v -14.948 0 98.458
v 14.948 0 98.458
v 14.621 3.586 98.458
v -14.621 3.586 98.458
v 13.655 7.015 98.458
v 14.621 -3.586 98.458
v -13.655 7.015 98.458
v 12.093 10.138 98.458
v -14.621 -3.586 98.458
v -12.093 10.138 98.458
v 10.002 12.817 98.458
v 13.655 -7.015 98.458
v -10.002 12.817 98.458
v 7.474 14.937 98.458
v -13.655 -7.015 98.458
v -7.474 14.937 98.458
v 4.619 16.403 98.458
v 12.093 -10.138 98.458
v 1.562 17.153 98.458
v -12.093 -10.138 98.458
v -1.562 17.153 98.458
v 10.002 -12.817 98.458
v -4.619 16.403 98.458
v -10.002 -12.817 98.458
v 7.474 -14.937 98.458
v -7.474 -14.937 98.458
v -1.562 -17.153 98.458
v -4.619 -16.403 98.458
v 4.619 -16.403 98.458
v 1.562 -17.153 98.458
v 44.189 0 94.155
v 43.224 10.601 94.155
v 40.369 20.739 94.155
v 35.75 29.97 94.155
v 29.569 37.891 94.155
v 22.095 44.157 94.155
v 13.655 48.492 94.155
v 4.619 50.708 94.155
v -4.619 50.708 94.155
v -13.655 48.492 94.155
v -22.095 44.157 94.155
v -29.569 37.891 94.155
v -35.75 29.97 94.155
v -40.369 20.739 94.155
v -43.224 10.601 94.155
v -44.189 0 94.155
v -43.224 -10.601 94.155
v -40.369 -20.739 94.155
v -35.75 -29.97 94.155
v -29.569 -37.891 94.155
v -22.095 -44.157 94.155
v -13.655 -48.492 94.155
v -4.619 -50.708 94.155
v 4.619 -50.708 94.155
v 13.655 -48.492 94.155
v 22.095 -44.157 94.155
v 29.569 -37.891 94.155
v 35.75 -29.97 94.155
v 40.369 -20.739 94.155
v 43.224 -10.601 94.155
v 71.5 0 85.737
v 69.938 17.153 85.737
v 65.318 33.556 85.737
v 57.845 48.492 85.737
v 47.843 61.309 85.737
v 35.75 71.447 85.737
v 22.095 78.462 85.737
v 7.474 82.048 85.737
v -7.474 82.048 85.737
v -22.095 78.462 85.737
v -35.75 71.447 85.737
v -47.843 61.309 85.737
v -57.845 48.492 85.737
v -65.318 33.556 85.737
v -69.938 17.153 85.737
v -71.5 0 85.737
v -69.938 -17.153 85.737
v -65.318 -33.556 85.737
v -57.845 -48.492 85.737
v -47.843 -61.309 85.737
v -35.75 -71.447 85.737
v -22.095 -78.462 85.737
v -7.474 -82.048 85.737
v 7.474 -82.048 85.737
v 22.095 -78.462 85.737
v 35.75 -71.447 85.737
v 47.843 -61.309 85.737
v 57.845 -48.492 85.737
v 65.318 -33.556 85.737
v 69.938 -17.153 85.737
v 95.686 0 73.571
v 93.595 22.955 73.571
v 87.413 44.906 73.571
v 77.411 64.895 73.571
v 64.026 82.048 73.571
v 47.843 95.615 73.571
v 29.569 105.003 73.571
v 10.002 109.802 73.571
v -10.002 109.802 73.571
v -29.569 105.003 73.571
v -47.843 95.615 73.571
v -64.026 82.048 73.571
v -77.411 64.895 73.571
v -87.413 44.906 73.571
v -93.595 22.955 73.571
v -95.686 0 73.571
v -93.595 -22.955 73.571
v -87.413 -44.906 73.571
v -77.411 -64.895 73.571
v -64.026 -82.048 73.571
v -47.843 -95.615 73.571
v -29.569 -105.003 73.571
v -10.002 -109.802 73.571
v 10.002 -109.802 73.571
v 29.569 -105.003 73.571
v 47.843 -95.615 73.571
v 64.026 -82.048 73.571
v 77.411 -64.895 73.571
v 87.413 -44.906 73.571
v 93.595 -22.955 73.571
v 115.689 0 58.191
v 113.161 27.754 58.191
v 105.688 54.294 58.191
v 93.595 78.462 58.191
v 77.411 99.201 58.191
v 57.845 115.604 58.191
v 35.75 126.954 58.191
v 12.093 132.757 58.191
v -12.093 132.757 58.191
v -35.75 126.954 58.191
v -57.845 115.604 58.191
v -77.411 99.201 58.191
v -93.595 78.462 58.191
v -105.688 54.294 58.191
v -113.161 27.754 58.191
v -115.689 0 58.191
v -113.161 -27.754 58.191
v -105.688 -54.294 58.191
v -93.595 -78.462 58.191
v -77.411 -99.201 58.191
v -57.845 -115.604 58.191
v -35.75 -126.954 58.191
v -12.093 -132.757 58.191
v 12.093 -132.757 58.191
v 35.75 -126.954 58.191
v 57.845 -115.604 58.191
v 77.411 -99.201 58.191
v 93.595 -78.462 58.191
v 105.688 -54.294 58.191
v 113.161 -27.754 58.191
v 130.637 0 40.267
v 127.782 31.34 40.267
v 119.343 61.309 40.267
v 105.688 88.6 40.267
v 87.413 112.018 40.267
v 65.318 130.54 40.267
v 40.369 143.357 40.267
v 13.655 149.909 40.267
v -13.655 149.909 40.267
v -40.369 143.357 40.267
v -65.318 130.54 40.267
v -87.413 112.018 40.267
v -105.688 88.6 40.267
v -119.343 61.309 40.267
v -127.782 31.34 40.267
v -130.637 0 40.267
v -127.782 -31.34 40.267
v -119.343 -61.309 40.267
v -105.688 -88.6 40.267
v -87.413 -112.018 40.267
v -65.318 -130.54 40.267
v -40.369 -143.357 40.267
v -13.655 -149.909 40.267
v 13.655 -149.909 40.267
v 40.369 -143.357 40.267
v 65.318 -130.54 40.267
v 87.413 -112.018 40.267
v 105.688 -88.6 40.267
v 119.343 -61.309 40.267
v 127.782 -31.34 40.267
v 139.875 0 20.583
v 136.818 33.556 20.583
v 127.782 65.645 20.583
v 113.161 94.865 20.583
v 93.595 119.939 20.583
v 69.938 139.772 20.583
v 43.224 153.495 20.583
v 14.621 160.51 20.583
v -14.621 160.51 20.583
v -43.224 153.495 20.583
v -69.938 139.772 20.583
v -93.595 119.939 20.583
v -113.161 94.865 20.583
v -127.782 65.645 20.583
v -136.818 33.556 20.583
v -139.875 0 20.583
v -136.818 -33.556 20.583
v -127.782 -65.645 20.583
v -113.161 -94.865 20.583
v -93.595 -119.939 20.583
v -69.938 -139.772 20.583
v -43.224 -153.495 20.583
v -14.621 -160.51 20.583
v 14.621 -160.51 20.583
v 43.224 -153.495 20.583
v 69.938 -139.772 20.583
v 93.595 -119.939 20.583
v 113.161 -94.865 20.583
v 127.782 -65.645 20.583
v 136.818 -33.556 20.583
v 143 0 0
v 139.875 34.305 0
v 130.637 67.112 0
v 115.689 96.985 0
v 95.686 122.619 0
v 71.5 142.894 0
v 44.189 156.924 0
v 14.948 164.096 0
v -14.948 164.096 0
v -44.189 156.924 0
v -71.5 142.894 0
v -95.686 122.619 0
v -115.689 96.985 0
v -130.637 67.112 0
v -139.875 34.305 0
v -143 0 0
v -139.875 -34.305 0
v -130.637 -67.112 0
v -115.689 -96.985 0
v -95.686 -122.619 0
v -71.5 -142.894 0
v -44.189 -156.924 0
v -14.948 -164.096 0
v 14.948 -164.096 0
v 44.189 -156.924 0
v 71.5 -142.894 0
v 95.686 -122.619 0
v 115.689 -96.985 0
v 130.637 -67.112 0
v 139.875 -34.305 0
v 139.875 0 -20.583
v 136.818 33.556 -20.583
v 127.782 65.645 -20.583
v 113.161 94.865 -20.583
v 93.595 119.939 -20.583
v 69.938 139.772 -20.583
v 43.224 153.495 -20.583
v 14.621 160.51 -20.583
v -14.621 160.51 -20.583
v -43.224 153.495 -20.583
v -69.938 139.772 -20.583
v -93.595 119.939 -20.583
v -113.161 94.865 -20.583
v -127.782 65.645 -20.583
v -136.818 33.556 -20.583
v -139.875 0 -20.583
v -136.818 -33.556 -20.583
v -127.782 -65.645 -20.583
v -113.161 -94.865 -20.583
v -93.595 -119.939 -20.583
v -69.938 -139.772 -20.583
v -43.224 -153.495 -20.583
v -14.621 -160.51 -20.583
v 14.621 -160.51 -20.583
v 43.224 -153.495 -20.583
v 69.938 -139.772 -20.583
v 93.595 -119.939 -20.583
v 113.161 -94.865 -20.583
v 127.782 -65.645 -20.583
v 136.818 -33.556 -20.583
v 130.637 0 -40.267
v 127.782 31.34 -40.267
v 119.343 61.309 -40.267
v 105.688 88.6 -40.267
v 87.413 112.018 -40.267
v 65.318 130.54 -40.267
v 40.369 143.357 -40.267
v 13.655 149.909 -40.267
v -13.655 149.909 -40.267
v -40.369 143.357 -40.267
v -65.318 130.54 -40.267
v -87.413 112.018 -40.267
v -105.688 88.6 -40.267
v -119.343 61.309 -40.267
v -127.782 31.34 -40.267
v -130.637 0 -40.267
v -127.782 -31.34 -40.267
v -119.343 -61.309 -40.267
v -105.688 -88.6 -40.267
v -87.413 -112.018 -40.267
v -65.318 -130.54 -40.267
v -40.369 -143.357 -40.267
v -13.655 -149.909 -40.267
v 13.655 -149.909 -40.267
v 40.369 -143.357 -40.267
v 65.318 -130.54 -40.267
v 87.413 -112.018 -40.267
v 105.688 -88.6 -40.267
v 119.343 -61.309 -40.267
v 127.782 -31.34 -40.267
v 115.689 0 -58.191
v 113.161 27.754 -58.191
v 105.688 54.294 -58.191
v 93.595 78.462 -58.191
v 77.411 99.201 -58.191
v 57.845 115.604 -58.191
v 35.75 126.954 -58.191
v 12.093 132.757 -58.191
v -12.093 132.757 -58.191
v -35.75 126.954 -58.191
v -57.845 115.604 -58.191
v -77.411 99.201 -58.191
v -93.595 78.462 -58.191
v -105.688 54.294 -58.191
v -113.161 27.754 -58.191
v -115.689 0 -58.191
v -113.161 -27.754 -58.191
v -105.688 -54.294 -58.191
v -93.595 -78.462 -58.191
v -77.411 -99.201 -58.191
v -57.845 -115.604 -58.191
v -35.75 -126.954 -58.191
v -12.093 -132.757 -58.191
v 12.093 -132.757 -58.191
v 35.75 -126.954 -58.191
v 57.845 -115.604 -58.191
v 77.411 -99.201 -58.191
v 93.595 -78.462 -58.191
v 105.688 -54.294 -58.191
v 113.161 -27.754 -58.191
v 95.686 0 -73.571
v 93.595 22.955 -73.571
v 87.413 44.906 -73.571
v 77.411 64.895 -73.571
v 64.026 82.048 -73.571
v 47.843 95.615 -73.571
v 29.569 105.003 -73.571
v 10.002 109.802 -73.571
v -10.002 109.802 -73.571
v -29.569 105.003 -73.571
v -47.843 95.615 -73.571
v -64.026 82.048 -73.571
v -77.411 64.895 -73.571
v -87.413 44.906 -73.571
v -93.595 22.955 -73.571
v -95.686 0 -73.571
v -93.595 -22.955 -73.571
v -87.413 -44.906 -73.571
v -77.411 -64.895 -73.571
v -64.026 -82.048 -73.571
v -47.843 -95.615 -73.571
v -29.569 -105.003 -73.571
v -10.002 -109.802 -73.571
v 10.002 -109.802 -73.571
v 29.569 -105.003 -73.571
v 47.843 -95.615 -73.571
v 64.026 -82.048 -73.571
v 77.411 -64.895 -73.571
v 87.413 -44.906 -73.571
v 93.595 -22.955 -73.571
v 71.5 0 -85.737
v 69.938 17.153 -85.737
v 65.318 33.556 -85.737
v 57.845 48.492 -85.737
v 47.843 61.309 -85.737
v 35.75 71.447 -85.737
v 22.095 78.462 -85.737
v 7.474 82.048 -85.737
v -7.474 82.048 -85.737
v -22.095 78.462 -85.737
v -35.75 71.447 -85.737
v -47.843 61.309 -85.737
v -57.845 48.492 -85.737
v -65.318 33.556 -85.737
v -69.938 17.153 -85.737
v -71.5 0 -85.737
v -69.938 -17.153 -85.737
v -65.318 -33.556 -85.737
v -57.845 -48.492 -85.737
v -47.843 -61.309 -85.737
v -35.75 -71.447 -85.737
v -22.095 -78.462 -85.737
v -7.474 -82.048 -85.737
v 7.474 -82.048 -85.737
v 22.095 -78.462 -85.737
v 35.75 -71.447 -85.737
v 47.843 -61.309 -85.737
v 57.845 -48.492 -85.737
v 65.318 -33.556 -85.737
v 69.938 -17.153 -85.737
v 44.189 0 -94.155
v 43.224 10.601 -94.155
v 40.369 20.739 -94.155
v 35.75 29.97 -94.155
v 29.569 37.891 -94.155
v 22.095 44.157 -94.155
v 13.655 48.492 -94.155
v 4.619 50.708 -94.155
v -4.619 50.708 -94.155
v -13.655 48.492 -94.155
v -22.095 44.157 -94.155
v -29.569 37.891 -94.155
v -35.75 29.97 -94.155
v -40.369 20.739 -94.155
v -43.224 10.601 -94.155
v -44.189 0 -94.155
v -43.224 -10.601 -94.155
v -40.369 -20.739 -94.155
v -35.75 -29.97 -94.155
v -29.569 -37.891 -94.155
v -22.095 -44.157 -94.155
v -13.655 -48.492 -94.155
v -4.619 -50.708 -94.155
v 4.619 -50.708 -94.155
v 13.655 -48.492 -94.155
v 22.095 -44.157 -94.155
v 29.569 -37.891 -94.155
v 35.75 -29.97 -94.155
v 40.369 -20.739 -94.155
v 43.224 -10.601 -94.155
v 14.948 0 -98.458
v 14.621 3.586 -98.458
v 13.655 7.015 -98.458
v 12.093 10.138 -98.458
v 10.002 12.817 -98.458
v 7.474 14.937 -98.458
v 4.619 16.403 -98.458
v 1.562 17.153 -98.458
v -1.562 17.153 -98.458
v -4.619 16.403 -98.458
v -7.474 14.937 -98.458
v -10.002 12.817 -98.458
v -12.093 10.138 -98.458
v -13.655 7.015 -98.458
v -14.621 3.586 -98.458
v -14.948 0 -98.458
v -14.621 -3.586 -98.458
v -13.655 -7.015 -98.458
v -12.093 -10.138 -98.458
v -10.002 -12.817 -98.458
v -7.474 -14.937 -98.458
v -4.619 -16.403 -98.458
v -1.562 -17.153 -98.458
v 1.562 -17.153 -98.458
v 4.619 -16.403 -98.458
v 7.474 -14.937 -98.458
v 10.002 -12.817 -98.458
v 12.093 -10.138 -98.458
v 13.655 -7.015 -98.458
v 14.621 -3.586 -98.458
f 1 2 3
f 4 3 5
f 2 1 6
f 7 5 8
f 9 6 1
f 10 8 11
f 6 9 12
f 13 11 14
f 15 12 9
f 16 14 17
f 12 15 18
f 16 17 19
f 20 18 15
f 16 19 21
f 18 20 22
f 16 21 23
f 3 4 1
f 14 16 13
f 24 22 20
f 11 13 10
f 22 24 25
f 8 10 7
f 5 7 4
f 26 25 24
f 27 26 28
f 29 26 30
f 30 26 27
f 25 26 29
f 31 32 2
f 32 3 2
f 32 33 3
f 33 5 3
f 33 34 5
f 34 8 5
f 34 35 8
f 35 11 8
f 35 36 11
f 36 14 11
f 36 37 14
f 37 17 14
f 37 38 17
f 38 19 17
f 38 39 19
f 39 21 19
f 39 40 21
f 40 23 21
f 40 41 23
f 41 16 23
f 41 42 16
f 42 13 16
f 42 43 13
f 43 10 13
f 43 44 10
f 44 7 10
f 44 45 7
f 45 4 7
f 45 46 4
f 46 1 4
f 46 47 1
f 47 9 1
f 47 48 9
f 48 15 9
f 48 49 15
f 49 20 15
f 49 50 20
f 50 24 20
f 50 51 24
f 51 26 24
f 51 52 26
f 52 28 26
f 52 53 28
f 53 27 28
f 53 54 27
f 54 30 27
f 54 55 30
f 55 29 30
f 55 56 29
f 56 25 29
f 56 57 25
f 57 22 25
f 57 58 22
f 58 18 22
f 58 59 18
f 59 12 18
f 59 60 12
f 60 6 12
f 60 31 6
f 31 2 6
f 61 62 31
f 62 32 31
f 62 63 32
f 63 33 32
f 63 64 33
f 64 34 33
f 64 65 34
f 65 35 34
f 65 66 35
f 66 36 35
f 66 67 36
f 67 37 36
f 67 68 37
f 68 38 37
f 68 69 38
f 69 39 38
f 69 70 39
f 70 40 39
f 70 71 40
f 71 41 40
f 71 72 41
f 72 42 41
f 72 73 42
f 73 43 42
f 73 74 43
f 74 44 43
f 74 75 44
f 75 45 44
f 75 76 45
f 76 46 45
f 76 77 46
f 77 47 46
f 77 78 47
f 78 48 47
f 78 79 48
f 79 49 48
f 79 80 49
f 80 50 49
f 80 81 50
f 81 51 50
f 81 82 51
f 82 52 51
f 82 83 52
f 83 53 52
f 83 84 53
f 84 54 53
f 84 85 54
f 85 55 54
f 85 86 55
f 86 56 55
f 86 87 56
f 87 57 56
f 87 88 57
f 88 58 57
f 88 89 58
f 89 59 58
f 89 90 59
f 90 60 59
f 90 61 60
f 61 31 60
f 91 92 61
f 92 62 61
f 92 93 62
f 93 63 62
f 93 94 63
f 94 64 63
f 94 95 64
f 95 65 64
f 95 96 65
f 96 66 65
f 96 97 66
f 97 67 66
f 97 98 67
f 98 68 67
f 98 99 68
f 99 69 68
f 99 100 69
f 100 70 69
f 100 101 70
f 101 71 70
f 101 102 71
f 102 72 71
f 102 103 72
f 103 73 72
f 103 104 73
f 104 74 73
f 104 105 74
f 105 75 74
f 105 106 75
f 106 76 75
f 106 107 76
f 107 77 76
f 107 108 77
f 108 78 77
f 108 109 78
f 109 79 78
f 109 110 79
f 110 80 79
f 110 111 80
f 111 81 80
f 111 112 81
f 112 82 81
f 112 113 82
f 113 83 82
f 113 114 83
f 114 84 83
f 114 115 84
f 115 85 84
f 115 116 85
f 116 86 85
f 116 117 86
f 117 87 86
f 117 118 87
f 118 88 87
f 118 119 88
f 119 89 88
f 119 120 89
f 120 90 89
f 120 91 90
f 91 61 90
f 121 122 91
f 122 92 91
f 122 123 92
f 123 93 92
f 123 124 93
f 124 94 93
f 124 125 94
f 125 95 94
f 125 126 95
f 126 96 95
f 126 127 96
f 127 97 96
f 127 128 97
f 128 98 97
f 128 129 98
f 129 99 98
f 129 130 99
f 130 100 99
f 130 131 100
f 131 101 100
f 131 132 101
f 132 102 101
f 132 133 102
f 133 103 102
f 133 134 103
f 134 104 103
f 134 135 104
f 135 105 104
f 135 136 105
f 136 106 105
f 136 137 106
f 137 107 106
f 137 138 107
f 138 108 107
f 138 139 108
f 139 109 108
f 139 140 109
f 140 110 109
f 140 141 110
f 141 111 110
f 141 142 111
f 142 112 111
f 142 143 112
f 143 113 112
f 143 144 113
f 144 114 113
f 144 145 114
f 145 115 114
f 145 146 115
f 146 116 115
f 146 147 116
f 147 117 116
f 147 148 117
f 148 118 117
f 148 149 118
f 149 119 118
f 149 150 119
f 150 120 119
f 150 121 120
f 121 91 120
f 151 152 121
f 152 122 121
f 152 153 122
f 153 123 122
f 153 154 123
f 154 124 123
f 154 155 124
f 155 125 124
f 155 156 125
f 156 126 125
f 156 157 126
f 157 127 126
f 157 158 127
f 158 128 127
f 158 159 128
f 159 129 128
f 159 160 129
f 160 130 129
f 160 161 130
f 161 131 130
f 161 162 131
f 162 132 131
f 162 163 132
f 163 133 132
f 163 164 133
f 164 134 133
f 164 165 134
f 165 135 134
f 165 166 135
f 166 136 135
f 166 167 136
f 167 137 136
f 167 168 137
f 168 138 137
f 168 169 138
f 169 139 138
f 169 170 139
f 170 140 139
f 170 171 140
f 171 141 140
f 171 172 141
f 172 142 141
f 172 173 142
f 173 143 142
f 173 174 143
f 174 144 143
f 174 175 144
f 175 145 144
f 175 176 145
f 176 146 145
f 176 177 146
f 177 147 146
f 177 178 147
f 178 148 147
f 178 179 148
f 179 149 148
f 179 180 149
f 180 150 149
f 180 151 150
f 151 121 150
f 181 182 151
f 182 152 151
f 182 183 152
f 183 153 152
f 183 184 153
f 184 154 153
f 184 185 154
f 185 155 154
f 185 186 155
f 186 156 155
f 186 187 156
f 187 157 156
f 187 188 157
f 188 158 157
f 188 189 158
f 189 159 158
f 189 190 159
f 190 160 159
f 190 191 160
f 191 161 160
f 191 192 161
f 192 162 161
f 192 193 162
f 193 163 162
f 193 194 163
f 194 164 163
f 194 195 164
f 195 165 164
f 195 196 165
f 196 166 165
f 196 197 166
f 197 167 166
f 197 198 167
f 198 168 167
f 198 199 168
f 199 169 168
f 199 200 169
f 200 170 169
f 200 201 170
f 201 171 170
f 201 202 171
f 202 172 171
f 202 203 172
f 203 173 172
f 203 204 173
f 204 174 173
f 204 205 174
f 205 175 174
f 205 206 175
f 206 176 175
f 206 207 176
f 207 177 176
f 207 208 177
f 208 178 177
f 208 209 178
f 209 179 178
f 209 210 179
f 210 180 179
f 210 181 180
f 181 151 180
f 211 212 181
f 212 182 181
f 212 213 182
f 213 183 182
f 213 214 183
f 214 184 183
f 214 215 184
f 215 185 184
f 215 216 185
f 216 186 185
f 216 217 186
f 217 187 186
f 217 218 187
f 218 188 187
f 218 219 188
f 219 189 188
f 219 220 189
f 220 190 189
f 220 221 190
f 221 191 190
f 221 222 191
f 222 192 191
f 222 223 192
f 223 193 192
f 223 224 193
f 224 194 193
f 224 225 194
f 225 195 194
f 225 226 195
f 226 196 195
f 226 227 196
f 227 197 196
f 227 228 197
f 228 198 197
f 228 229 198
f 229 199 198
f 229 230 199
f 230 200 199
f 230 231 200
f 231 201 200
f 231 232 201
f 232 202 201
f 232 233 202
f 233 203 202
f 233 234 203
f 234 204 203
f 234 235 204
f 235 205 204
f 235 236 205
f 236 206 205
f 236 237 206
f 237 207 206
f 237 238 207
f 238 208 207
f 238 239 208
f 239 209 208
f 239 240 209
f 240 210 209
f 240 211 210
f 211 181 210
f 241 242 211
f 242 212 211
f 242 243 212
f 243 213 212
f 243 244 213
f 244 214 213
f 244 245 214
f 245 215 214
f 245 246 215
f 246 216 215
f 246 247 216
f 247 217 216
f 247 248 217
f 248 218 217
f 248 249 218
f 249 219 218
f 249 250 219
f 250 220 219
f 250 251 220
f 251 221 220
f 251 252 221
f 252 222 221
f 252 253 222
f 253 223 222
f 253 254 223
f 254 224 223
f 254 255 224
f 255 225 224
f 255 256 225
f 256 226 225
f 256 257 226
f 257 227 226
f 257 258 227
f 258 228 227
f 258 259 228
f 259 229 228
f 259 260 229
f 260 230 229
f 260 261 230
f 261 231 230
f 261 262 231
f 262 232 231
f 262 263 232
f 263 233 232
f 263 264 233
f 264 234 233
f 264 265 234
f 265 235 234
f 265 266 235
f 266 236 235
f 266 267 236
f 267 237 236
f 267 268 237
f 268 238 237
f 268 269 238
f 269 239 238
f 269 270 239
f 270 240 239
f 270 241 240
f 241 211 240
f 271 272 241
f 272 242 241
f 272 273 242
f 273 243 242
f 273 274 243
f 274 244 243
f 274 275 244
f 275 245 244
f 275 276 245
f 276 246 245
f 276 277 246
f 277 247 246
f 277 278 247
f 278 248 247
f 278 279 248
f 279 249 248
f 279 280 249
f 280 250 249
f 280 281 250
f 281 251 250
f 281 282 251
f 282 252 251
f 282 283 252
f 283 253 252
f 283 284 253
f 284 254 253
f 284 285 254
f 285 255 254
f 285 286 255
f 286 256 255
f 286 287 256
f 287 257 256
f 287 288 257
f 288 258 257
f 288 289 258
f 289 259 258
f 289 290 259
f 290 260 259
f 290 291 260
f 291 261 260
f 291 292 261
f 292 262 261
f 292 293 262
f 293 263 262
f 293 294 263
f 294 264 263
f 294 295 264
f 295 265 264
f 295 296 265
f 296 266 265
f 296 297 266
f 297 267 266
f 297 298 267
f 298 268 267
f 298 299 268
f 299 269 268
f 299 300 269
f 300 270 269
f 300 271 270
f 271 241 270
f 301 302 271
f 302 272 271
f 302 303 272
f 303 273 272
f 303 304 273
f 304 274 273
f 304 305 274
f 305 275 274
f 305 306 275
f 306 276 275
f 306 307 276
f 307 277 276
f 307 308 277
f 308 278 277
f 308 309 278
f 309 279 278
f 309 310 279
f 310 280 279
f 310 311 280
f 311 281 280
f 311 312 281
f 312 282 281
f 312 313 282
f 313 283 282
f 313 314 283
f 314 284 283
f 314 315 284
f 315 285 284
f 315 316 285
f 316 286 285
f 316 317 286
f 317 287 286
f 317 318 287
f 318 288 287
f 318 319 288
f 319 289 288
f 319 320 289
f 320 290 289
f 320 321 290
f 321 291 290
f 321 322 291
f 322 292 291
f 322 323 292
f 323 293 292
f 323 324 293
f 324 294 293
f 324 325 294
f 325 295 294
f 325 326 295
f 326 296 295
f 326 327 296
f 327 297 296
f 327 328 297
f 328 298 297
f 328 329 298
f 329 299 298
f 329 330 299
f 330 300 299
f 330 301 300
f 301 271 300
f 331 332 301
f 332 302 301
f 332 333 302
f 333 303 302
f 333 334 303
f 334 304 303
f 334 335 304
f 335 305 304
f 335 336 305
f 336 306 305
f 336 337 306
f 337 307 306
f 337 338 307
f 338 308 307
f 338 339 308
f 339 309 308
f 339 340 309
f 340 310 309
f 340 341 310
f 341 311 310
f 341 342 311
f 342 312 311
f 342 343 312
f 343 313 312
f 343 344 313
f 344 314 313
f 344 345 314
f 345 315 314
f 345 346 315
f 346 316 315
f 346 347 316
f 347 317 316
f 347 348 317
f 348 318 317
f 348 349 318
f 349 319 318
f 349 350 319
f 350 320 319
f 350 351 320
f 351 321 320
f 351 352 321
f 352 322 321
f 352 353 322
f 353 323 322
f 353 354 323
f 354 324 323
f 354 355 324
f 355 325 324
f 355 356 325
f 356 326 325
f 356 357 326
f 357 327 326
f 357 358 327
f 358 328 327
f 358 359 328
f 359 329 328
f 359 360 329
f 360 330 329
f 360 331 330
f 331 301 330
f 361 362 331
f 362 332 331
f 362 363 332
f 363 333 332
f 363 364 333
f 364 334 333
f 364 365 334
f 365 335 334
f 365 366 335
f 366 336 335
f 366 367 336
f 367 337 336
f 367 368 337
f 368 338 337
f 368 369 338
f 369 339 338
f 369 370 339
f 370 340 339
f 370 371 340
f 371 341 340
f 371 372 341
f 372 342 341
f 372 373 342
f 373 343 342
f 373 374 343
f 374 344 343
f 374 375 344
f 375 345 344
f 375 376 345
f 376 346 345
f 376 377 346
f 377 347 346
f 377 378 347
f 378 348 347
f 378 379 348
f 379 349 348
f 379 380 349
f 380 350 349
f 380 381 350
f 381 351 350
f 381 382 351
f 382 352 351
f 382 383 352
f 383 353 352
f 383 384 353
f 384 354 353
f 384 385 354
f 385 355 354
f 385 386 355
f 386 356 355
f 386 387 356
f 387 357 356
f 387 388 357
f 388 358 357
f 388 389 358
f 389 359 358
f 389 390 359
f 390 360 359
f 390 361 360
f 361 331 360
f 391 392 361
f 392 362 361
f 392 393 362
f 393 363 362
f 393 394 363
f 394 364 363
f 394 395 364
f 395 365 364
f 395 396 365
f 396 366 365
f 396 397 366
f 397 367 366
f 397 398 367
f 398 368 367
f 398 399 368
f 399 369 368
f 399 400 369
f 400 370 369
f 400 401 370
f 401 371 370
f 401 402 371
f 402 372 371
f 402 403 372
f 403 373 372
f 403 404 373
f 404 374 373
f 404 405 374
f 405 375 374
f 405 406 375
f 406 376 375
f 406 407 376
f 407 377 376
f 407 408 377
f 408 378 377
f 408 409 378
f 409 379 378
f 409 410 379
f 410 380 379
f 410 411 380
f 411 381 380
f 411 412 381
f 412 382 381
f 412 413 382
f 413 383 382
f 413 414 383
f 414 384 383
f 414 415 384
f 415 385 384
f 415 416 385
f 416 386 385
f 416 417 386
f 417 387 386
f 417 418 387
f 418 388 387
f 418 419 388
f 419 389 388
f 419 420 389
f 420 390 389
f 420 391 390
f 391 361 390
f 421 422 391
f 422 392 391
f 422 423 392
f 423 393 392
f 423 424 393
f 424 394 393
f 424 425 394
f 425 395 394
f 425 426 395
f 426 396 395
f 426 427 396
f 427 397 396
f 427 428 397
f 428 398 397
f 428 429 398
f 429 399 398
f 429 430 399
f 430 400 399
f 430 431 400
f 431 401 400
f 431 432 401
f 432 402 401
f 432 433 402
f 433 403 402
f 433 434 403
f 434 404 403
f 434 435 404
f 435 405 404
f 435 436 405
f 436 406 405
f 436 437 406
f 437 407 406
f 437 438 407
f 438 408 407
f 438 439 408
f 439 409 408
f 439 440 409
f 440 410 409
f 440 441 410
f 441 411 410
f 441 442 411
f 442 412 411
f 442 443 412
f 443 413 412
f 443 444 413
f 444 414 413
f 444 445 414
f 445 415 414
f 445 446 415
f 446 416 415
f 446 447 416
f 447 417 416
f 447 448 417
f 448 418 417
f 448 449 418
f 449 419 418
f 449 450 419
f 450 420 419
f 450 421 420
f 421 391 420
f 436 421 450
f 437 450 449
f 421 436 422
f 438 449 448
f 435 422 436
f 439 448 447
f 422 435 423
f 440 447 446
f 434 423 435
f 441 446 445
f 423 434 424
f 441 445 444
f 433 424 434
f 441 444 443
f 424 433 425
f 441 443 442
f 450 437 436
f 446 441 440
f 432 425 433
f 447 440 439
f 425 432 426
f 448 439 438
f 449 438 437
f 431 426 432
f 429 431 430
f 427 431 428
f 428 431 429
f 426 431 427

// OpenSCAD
// Generated by SolidPython 1.0.1 on 2020-07-29 00:46:51


scale(v = [13, 15, 9]) {
	sphere(r = 11);
}
/***********************************************
*********      SolidPython code:      **********
************************************************
 
# import packages: SolidPython
from solid import *
from solid.utils import *
from itertools import chain, combinations, permutations


class Resize:

    def __init__(self, scad_file):
        self.scad_file = scad_file
        #self.scad_file = import_scad(scad_file)
        # cone/cylinder param:
        self.r1 = 0
        self.r2 = 0
        self.h = 0
        # rectangular prism param:
        self.w = 0
        self.l = 0
        # ellipse param:
        self.r = 0

    # import OpenScad code (file name corresponds to shape)


    # classify shape + parameters
    def assign(self, param1, param2, param3):
        if self.scad_file == 'cone.scad':
            self.r1 = param1
            self.r2 = param2
            self.h = param3
        elif self.scad_file == 'cylinder.scad':
            self.r1 = param1
            self.r2 = param2
            self.h = param3
        elif self.scad_file == 'rectangularPrism.scad':
            self.h = param1
            self.l = param2
            self.w = param3
        else:
            self.r = param1
            self.h = param2

    # resize parameters
    def iterate(self):
        x = range(3, 20, 2)
        i = 1
        if self.scad_file == 'cone.scad':
            tempList = list(permutations(x, 2))
            for temp in tempList:
                param1 = temp[0]
                param2 = temp[1]
                filepath = 'produced_scad_files/' + 'cone' + str(param1) + '_' + str(param2) + '_' + '.scad'
                scad_render_to_file(cylinder(h=param1, r1=param2, r2=0), filepath)

        elif self.scad_file == 'cylinder.scad':
            tempList = list(permutations(x, 3))
            for temp in tempList:
                param1 = temp[0]
                param2 = temp[1]
                filepath = 'produced_scad_files/' + 'cylinder' + str(param1) + '_' + str(param2) + '_' + '.scad'
                scad_render_to_file(cylinder(h=param1, r1=param2, r2=param2), filepath)

        elif self.scad_file == 'rectangularPrism.scad':
            tempList = list(permutations(x, 3))
            for temp in tempList:
                param1 = temp[0]
                param2 = temp[1]
                param3 = temp[2]
                filepath = 'produced_scad_files/' + 'rectangularPrism' + str(param1) + '_' + str(param2) + '_' + str(
                    param3) + '.scad'
                scad_render_to_file(cube(size=(param1, param2, param3)), filepath)

        elif self.scad_file == 'ellipse.scad':
            tempList = list(permutations(x, 4))
            for temp in tempList:
                param1 = temp[0]
                param2 = temp[1]
                param3 = temp[2]
                param4 = temp[3]
                filepath = 'produced_scad_files/' + 'ellipse' + str(param1) + '_' + str(param2) + '_' + str(param3) + '_' + str(param4) + '.scad'
                scad_render_to_file(scale([param1, param2, param3])(sphere(r=param4)), filepath)

    def render_to_scadfile(self):
        scad_render_to_file(scad, 'example.scad') 
 
************************************************/
